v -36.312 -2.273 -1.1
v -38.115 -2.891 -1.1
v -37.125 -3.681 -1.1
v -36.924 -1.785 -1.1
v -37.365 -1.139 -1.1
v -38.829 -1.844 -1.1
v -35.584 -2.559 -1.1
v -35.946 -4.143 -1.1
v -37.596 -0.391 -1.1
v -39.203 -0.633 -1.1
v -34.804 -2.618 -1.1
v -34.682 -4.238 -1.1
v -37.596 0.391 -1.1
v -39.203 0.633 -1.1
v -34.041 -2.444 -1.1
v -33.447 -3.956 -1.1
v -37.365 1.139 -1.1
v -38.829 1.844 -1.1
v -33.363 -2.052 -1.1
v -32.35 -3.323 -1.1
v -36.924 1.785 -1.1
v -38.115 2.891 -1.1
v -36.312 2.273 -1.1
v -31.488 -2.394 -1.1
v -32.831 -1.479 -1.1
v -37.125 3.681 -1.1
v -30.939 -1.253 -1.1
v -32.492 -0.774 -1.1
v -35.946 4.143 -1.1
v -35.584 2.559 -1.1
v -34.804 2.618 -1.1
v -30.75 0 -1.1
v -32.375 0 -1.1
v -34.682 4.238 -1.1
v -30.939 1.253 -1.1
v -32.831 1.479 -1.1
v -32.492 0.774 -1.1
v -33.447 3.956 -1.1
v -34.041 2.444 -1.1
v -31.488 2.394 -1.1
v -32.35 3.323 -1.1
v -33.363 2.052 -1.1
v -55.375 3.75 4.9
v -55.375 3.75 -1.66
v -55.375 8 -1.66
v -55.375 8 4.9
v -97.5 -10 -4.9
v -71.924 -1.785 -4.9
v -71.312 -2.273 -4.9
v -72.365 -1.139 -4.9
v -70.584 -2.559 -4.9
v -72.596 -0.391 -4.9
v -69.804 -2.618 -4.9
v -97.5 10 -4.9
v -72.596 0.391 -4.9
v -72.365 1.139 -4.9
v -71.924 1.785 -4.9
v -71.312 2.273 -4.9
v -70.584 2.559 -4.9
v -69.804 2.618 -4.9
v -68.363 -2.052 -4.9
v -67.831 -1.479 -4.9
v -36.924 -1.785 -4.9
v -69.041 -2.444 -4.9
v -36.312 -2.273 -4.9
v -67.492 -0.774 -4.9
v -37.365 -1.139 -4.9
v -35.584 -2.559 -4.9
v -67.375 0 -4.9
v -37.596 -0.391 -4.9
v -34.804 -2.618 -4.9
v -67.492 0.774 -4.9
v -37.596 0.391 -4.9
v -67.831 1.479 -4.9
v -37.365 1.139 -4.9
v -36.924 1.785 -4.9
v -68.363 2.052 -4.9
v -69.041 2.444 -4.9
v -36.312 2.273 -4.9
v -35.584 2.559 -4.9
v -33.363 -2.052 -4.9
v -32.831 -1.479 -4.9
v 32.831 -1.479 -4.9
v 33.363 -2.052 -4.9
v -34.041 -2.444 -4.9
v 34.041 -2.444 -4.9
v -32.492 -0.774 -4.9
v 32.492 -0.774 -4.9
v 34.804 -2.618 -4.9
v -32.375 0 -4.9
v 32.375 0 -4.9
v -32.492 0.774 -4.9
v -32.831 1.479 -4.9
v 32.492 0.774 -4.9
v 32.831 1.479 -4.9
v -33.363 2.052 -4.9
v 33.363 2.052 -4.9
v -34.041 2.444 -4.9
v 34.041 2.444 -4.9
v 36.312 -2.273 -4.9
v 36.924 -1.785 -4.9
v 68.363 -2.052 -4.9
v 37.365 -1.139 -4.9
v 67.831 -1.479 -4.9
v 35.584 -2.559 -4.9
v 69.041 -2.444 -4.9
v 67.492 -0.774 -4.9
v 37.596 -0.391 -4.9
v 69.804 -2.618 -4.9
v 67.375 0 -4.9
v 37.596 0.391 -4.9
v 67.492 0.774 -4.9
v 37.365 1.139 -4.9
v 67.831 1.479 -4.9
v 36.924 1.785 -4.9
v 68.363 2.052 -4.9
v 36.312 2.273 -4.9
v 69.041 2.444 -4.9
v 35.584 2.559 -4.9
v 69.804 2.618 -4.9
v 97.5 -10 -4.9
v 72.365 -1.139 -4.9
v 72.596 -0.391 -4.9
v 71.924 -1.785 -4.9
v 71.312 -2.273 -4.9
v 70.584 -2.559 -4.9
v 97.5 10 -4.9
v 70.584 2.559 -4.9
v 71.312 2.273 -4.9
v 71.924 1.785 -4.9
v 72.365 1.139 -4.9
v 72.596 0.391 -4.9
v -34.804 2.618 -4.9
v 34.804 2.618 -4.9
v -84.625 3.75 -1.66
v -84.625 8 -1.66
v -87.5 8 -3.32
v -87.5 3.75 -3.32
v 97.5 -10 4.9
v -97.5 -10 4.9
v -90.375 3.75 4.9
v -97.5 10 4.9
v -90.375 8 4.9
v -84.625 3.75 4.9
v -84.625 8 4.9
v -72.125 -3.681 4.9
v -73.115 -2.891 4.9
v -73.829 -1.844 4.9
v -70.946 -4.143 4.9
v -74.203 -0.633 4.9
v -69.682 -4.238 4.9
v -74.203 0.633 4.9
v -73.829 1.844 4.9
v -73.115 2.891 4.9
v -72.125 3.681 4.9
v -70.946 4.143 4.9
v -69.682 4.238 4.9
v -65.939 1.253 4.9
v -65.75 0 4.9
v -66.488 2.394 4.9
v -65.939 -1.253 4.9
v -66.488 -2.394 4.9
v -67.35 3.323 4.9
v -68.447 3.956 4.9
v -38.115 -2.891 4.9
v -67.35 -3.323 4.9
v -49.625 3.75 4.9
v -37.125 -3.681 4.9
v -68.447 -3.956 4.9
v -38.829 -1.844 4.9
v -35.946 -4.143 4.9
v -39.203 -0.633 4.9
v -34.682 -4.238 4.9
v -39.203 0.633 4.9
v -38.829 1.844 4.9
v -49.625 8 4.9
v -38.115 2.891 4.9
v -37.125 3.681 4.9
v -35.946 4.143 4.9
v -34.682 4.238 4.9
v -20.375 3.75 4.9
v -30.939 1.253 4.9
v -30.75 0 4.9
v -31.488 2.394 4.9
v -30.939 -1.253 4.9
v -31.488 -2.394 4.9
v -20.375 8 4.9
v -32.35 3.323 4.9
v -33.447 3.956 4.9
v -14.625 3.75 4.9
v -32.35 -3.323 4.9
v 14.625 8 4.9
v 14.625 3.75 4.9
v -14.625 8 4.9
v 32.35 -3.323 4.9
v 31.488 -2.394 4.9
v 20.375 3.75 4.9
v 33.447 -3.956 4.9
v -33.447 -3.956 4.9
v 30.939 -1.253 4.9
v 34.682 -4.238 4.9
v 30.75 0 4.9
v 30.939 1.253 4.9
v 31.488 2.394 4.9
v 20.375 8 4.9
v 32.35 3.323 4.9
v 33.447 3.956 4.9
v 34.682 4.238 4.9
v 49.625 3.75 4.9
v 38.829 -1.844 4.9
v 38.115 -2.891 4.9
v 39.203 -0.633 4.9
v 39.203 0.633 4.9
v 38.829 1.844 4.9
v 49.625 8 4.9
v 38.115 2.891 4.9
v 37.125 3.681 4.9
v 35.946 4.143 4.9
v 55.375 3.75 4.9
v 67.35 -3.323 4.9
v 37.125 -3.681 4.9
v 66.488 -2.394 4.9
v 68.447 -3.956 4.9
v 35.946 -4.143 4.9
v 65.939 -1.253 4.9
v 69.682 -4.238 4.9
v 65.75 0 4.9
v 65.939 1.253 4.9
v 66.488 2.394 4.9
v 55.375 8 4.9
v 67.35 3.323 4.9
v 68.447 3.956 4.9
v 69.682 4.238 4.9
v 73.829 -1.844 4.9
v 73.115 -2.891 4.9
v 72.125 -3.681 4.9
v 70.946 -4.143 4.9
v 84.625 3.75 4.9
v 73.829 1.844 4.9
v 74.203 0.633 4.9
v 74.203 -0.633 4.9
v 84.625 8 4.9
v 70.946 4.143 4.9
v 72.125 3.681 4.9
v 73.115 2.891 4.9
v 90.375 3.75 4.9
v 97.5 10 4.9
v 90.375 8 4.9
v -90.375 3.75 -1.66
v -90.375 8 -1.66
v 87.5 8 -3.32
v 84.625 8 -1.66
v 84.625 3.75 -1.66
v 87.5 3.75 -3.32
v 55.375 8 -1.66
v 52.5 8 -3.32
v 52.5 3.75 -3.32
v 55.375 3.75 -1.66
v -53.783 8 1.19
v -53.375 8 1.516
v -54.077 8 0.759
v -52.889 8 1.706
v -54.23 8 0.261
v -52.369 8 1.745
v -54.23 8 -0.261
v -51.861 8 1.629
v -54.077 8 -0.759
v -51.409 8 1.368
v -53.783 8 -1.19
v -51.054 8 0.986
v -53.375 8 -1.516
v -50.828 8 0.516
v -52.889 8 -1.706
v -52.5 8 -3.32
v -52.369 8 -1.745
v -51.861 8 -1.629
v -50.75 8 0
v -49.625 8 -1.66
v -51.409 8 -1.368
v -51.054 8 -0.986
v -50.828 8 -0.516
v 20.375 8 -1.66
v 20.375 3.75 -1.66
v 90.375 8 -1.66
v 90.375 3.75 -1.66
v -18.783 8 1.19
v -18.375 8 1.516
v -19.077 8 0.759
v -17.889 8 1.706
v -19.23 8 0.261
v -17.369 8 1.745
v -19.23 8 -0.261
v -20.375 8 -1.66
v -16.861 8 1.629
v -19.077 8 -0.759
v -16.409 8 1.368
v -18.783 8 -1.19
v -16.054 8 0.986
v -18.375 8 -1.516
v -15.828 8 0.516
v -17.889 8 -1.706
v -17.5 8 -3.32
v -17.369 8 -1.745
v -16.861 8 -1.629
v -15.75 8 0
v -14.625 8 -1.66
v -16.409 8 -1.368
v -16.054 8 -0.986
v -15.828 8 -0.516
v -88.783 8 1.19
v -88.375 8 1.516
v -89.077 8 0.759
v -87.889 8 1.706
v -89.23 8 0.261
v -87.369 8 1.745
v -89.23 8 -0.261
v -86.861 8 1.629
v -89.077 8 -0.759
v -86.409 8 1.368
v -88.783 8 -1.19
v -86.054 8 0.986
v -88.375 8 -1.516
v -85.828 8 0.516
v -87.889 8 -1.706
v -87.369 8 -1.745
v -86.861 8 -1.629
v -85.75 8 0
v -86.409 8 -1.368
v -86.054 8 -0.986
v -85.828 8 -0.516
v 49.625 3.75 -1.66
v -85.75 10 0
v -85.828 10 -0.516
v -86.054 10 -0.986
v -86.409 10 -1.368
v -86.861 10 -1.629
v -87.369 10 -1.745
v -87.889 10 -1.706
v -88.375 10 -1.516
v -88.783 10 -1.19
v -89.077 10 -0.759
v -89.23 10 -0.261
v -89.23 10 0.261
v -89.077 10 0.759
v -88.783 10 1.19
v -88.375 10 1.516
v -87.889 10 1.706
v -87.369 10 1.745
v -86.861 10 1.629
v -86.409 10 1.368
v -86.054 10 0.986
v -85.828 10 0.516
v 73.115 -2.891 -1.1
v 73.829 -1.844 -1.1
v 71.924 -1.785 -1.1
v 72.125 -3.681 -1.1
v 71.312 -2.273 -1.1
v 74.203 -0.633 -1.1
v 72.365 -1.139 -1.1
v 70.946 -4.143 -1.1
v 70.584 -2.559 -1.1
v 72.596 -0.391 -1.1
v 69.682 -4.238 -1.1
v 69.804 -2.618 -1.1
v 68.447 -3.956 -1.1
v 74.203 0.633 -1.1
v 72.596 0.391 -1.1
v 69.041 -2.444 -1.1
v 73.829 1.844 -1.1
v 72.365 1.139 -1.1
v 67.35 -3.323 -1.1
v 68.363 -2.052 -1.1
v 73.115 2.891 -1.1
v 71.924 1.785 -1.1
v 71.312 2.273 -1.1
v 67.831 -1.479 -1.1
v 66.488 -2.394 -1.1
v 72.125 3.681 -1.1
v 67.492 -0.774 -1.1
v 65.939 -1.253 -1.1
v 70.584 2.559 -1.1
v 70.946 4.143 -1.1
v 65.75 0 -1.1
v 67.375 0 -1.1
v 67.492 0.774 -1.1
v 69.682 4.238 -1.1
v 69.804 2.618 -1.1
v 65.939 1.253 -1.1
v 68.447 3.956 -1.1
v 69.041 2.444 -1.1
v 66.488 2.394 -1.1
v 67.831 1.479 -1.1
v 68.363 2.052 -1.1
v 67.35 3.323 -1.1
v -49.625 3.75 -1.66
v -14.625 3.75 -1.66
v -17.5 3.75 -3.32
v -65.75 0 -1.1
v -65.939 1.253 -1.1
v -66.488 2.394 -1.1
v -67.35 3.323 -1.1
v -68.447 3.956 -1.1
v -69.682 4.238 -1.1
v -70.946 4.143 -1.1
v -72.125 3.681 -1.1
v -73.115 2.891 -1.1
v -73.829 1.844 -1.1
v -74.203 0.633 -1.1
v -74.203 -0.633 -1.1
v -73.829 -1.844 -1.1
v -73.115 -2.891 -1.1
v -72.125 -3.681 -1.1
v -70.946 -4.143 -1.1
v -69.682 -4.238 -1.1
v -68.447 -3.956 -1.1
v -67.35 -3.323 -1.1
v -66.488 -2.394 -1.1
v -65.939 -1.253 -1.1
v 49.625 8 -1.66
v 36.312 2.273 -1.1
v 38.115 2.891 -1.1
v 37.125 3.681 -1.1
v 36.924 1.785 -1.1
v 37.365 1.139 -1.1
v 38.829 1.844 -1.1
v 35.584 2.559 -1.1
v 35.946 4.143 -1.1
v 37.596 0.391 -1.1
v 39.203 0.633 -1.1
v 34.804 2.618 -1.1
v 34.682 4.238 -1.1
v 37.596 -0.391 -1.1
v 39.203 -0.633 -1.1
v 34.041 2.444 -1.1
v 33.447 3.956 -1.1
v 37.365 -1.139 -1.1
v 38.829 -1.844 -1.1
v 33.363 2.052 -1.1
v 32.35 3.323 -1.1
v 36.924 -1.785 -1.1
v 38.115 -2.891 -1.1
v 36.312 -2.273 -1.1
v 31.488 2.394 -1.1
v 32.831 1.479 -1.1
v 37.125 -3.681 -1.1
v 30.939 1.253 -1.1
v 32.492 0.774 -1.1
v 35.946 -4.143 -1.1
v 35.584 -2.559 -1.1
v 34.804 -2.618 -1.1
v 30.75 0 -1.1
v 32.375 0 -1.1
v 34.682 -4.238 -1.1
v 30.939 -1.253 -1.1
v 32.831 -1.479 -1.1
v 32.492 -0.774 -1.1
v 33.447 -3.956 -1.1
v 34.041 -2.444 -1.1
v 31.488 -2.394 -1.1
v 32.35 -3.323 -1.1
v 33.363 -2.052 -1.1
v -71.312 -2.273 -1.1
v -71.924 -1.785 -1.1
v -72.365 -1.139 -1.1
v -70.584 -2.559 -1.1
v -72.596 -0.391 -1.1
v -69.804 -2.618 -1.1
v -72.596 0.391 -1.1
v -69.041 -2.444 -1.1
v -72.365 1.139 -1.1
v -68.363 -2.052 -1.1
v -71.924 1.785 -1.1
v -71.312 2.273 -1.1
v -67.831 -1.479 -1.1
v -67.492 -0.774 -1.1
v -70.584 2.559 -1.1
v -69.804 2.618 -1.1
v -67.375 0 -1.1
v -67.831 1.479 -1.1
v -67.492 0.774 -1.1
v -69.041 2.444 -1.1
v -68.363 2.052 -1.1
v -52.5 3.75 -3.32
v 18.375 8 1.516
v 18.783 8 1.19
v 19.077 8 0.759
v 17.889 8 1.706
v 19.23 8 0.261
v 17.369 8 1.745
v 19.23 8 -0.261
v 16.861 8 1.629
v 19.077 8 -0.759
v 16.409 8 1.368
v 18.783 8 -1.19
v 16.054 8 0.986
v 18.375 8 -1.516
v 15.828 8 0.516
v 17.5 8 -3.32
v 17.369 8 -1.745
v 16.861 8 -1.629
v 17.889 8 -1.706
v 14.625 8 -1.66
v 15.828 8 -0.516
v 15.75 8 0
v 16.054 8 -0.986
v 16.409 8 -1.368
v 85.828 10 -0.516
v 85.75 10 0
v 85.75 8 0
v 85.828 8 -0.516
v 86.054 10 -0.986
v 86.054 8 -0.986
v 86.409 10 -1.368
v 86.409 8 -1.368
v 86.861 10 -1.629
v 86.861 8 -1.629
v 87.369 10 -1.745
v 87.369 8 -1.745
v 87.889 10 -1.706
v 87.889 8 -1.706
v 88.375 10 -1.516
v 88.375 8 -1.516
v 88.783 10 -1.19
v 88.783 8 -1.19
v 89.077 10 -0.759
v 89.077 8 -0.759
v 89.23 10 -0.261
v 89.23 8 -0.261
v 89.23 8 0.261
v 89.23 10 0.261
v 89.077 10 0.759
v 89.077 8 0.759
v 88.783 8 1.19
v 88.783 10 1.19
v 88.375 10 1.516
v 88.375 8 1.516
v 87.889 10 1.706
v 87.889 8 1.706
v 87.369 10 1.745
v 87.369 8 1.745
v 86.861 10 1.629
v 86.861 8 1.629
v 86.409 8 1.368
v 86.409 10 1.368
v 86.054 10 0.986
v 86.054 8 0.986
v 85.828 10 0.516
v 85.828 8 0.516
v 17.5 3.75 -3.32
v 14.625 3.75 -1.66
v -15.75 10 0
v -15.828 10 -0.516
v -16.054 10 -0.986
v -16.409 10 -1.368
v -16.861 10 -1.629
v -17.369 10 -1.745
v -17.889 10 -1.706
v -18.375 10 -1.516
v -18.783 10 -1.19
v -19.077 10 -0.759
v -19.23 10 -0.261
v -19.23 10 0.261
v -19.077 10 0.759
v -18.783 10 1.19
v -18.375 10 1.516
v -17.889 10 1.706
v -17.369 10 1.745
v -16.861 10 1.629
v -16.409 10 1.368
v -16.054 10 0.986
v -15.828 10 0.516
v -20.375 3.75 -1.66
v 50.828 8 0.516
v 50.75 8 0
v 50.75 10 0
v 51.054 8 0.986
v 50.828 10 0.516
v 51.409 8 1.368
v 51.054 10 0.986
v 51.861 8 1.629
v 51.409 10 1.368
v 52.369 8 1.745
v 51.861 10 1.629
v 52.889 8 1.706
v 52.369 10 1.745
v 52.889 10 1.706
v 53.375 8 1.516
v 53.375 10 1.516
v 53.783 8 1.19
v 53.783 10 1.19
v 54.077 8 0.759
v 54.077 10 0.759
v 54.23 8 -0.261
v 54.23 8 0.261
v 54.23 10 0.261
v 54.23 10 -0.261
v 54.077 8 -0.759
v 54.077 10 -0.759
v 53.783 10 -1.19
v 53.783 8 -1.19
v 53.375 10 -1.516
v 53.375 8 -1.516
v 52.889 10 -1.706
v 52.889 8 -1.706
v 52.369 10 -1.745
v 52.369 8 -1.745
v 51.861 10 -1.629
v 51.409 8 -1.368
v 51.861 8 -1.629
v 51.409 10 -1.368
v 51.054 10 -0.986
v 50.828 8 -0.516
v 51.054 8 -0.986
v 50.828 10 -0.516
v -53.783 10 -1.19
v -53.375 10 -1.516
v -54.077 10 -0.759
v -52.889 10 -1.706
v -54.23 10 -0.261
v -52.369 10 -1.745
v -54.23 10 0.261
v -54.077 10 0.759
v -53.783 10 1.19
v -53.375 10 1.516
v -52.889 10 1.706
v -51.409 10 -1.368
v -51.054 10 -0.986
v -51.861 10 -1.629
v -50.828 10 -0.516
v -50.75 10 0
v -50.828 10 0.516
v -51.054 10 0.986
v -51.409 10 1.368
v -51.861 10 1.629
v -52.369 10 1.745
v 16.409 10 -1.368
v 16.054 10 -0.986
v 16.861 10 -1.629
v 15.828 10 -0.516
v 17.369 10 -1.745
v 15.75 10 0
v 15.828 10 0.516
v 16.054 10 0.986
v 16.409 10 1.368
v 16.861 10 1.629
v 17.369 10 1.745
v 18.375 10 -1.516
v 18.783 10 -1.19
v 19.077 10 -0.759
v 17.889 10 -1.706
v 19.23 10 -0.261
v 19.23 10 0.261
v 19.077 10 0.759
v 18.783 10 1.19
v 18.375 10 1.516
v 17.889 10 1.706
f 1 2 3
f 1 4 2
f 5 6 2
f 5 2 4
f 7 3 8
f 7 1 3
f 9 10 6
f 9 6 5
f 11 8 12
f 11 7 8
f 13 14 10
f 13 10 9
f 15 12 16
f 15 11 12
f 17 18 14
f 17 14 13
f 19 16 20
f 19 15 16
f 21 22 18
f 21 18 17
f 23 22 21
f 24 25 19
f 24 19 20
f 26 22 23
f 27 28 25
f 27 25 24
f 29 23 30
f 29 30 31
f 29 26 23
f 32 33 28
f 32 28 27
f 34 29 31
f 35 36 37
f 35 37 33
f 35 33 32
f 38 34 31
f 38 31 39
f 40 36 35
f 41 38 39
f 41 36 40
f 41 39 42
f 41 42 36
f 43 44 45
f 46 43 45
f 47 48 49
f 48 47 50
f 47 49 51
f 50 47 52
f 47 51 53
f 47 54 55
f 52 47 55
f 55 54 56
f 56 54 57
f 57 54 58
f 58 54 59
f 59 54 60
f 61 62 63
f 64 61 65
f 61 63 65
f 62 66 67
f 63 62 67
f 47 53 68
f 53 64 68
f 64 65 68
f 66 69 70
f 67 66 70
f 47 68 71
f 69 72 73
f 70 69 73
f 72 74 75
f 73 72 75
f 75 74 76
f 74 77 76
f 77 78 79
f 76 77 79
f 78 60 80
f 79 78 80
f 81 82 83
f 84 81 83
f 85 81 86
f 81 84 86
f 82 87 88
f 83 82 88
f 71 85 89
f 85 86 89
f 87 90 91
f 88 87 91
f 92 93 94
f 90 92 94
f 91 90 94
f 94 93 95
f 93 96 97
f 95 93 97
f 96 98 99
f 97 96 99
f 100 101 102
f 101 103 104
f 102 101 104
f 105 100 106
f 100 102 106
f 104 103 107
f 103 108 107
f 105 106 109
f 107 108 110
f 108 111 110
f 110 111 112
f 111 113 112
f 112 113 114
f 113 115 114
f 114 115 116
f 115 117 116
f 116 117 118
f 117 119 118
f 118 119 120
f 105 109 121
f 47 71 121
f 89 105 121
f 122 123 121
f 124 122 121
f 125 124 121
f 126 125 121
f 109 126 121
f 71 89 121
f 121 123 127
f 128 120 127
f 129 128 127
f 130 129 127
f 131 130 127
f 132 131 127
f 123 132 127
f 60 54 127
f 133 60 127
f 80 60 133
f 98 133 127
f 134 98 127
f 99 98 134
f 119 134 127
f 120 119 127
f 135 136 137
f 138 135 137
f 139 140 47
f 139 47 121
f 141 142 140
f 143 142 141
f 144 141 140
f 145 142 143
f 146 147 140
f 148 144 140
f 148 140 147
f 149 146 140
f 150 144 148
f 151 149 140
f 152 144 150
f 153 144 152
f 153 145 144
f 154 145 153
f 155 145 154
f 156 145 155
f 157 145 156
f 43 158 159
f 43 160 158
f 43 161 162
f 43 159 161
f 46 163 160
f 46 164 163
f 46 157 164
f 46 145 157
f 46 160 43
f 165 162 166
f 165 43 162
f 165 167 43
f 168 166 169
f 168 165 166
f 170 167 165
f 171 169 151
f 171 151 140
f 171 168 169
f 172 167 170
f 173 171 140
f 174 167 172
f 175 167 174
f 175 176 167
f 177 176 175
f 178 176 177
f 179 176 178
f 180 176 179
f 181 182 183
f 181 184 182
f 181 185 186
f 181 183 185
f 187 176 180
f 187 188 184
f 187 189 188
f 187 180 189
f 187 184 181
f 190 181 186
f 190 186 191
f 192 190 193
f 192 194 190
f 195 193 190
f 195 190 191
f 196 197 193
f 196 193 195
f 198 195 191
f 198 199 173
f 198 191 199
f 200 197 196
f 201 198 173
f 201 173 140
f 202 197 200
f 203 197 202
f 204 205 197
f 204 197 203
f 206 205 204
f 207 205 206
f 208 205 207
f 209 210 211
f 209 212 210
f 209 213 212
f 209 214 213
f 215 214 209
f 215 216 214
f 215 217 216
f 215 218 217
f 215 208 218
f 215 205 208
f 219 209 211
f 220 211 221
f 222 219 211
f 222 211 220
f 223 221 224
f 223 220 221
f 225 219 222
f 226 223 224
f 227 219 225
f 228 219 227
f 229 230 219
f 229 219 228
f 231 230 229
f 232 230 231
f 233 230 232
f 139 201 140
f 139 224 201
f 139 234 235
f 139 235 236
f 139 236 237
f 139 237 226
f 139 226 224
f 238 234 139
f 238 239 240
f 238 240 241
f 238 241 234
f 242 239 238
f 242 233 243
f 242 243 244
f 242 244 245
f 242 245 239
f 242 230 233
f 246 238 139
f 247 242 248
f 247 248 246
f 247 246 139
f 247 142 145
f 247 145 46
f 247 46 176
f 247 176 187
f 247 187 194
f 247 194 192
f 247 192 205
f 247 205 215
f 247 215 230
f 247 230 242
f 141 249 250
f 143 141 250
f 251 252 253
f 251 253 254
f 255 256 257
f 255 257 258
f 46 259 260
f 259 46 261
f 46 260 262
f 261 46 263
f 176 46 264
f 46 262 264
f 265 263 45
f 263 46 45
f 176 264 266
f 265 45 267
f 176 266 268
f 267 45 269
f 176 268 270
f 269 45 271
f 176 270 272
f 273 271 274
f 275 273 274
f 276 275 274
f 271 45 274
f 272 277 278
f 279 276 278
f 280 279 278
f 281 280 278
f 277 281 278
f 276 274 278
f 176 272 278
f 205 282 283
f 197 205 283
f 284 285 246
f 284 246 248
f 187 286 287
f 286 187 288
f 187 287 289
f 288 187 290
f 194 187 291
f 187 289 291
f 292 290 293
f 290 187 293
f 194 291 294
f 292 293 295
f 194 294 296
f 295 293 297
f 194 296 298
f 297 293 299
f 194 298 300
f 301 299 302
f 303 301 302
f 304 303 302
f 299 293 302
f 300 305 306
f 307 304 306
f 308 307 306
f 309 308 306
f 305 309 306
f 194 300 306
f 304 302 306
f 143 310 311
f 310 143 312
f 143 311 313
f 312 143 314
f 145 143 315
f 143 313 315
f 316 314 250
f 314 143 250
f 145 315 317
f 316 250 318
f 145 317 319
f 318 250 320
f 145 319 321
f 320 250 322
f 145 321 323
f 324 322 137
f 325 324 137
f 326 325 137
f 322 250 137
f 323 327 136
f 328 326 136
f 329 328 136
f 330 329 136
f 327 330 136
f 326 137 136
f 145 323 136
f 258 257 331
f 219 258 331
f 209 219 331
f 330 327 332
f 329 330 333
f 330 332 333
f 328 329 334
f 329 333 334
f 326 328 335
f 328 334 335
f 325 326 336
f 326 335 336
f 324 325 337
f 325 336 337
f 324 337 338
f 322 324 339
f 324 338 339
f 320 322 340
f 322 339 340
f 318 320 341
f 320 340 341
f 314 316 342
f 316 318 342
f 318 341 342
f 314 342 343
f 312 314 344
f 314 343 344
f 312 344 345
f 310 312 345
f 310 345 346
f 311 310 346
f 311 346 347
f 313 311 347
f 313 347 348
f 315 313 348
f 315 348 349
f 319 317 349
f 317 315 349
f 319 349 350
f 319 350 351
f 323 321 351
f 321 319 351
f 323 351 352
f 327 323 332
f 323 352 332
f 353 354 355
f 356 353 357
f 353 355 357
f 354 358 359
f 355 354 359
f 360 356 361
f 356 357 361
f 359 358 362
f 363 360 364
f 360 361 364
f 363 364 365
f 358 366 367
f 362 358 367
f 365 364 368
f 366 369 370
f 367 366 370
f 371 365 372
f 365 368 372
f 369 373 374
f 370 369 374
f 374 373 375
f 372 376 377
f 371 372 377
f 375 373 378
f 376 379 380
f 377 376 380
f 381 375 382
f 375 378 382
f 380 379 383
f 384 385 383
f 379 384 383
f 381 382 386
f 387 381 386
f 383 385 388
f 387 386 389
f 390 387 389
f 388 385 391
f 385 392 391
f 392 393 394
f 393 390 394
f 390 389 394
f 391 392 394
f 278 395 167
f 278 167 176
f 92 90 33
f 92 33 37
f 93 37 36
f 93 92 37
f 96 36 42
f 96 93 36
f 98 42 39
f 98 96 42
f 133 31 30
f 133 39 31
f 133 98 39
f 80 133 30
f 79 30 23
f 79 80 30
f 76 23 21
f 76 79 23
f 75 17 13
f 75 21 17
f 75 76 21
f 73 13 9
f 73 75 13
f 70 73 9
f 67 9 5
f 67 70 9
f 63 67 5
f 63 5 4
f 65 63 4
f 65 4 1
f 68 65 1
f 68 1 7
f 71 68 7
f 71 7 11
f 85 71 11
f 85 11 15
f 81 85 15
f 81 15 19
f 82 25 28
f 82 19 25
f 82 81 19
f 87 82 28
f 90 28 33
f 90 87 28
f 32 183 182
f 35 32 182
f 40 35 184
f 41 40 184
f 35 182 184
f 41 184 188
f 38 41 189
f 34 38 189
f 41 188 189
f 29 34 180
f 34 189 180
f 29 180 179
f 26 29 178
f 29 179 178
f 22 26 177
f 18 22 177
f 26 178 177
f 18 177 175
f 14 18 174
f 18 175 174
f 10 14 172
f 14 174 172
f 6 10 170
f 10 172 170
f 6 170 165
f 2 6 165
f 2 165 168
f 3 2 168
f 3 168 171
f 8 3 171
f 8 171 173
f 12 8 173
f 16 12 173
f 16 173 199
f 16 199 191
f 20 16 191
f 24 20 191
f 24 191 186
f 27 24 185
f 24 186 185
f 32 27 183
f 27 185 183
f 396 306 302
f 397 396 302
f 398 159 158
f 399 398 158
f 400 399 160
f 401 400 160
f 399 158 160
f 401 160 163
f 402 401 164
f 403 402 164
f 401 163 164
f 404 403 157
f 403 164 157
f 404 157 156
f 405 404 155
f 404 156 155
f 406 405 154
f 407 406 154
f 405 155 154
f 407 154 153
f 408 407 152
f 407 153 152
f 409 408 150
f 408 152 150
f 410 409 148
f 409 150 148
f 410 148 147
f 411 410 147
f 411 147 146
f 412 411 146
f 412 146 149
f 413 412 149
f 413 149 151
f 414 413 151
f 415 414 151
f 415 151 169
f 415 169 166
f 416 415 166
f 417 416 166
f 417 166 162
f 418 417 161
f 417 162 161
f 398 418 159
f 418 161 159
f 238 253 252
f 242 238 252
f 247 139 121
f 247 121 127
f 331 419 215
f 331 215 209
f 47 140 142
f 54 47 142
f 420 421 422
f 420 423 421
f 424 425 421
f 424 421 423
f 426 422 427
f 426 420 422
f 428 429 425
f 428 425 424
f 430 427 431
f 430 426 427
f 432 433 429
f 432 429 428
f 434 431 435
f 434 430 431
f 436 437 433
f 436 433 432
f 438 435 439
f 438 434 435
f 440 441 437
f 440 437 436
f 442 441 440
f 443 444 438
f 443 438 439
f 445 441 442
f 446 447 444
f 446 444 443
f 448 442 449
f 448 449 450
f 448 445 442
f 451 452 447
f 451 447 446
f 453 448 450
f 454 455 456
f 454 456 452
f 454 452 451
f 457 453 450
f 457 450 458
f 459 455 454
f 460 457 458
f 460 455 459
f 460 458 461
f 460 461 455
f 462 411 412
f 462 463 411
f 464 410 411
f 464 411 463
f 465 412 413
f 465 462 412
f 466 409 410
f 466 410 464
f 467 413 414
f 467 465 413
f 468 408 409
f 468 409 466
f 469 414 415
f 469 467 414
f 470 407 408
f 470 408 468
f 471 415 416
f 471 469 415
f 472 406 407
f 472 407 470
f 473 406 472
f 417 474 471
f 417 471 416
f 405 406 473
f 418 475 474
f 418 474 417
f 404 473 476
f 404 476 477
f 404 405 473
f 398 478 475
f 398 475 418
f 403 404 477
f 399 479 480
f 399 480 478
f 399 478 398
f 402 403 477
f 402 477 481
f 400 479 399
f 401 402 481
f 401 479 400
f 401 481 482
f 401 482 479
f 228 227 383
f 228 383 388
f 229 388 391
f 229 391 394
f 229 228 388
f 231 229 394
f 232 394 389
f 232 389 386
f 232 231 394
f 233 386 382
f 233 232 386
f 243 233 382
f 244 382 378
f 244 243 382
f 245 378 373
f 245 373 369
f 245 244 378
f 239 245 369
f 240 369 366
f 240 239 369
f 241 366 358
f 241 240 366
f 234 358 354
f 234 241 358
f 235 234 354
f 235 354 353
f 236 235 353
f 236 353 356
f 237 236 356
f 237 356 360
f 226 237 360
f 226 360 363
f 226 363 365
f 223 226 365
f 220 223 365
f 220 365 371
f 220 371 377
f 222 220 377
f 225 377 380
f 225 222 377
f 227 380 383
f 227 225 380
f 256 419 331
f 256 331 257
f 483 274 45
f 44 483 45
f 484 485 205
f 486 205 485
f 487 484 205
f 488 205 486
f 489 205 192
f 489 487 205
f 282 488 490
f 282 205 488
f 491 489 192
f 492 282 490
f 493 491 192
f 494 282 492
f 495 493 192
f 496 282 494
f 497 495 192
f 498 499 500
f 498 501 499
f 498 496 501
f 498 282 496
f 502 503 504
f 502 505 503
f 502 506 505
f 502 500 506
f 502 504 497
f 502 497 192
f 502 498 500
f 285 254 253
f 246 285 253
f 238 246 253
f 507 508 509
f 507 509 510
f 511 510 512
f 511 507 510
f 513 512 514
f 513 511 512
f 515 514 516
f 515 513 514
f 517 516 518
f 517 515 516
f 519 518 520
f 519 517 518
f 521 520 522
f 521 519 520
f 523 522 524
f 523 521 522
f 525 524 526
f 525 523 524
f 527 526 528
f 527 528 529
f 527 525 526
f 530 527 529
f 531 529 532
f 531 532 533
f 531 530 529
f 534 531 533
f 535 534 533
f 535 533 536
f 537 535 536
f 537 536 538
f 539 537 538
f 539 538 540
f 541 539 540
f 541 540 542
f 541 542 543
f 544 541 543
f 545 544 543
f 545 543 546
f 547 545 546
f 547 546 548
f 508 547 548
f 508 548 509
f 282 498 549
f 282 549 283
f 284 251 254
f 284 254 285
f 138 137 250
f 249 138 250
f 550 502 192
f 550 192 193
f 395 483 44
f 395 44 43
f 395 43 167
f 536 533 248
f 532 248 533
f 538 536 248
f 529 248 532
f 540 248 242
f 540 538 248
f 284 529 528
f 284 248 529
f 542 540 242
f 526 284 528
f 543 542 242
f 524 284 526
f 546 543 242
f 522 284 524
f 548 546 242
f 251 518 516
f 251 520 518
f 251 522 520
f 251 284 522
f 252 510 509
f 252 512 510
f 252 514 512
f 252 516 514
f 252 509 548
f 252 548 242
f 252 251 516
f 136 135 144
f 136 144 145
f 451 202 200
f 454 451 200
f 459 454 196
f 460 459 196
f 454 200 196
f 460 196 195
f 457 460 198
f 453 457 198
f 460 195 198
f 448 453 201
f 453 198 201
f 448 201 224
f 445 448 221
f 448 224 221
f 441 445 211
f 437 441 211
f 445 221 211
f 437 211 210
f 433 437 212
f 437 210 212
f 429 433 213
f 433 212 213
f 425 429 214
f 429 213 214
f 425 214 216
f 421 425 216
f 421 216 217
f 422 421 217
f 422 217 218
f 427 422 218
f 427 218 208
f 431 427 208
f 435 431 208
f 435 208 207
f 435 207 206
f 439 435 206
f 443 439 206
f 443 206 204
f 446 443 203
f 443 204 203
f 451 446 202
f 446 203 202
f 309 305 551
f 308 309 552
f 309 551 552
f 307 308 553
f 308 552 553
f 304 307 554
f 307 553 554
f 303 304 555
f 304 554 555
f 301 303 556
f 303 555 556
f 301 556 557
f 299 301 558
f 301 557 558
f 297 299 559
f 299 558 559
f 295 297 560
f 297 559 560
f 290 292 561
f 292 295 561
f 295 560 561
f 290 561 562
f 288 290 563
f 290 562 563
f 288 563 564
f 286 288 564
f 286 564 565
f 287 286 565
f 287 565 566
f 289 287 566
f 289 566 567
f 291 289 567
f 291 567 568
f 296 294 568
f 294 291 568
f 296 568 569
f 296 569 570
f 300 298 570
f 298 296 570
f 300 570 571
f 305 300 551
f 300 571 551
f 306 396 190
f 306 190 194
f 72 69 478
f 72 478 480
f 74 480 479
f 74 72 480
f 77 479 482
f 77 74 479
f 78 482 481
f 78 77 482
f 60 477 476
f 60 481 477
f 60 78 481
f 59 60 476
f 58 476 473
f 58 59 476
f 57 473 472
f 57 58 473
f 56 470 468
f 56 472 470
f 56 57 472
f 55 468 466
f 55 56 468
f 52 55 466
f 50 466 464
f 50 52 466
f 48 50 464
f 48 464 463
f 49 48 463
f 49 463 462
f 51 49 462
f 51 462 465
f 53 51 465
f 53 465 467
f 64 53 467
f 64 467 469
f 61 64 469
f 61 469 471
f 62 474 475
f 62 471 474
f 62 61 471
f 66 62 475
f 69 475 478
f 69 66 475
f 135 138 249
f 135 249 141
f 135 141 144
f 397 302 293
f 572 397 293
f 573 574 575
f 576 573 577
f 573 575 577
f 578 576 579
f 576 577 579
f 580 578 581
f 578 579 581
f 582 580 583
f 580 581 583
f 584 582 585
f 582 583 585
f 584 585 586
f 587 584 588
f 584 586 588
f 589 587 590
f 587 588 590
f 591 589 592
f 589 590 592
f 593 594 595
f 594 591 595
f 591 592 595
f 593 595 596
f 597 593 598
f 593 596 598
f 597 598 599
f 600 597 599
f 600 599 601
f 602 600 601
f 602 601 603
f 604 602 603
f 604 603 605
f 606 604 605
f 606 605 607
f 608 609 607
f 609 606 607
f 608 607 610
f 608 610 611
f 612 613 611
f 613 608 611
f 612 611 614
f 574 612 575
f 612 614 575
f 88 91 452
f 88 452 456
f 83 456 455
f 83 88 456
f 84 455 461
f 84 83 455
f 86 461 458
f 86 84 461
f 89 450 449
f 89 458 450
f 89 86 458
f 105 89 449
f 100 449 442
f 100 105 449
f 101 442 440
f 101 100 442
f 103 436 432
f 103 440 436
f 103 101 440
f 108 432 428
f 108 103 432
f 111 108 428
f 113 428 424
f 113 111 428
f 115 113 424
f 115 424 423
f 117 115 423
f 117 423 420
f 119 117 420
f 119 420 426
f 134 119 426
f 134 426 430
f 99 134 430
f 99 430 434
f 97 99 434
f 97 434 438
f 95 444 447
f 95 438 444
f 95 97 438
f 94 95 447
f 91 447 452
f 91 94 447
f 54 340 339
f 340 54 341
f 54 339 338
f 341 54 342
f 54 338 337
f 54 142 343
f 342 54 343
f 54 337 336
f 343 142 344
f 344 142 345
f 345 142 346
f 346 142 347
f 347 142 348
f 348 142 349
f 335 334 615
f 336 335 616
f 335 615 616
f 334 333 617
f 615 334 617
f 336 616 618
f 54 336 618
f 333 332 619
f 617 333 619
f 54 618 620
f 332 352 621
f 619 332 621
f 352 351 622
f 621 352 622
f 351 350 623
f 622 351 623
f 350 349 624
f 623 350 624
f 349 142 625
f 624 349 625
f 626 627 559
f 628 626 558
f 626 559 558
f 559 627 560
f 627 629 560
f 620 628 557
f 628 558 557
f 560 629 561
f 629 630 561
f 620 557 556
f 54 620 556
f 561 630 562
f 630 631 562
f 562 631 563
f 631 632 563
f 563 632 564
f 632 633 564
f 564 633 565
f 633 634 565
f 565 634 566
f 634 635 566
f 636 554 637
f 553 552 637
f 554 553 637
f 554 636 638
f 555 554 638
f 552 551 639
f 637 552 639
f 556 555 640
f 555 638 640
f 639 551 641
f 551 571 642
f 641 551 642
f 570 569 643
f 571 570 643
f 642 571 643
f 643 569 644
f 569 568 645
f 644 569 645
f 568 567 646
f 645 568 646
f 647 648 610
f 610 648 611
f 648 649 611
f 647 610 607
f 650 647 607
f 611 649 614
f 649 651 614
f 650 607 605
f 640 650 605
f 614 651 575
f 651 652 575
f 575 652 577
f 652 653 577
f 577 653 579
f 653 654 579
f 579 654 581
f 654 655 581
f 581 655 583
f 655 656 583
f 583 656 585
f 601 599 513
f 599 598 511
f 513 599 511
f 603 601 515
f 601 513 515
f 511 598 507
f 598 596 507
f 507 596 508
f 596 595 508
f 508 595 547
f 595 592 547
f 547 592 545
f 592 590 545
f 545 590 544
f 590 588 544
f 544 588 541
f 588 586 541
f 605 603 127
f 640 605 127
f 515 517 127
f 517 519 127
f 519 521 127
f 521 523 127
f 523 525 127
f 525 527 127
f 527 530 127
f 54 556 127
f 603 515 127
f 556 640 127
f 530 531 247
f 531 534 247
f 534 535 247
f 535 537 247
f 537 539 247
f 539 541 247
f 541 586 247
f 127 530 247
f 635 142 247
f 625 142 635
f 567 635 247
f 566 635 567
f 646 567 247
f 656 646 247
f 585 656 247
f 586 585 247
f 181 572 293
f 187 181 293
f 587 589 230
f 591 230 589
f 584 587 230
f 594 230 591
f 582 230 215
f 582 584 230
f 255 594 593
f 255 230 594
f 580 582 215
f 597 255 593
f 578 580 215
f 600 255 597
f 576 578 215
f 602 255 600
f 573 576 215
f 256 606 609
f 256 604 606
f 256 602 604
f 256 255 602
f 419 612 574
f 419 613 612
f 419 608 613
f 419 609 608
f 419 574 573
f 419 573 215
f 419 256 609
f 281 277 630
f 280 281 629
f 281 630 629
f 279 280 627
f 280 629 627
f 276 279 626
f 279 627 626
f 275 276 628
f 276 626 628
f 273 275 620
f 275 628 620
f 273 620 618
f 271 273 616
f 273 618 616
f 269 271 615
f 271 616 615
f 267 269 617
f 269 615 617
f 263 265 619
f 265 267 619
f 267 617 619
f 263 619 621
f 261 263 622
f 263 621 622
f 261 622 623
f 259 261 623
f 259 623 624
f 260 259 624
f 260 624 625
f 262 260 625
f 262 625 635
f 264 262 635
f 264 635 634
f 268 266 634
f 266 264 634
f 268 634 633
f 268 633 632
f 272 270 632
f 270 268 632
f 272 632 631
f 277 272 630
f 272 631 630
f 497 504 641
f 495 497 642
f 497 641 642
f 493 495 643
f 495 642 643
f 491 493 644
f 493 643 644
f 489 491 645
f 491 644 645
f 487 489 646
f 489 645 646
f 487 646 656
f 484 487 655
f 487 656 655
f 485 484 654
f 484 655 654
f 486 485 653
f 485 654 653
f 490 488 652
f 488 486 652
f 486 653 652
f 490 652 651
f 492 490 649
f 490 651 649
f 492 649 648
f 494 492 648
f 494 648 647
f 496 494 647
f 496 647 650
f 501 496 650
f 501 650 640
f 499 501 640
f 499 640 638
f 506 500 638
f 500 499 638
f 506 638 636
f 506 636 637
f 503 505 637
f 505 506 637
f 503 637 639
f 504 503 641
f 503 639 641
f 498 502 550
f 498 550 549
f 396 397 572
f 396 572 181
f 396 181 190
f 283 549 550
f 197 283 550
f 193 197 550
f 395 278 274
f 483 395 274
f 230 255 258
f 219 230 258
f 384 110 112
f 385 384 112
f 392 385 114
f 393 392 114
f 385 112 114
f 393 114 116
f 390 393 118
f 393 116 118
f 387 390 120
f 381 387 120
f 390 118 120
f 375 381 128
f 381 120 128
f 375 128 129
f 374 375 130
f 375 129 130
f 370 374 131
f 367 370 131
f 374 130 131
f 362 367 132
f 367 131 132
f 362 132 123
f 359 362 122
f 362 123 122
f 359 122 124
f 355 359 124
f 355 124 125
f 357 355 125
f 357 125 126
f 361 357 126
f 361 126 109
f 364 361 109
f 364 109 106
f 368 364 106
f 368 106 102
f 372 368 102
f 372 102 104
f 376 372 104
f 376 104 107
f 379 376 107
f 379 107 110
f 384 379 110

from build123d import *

# Parameters (mm, degrees)
SKETCH1_W               = 195
SKETCH1_H               = 20
BOSS_EXTRUDE1_DEPTH     = 4.9
SKETCH2_R               = 1.75
CUT_EXTRUDE1_DEPTH      = 6
CUT_EXTRUDE2_START      = -2
CUT_EXTRUDE2_DEPTH      = 4.25
SKETCH4_W               = 5.75
SKETCH4_H               = 4.25
CUT_EXTRUDE3_DEPTH      = 5.9
LPATTERN1_COUNT         = 3
LPATTERN1_PITCH         = 35
MIRROR1_COPY_1_SKETCH_R = 1.75
MIRROR1_COPY_1_DEPTH    = 6
MIRROR1_COPY_2_SKETCH_R = 1.75
MIRROR1_COPY_2_DEPTH    = 6
MIRROR1_START           = -2
MIRROR1_COPY_3_DEPTH    = 4.25
MIRROR1_COPY_4_DEPTH    = 4.25
MIRROR1_COPY_5_SKETCH_W = 5.75
MIRROR1_COPY_5_SKETCH_H = 4.25
MIRROR1_COPY_5_DEPTH    = 5.9
MIRROR1_COPY_6_SKETCH_W = 5.75
MIRROR1_COPY_6_SKETCH_H = 4.25
MIRROR1_COPY_6_DEPTH    = 5.9
SKETCH5_R               = 4.25
CUT_EXTRUDE4_DEPTH      = 6
CUT_EXTRUDE5_START      = -4.8
SKETCH6_R               = 2.625
CUT_EXTRUDE5_DEPTH      = 11.8
LPATTERN2_COUNT         = 2
LPATTERN2_PITCH         = 35
MIRROR2_COPY_1_SKETCH_R = 4.25
MIRROR2_COPY_1_DEPTH    = 6
MIRROR2_START           = -4.8
MIRROR2_COPY_2_SKETCH_R = 2.625
MIRROR2_COPY_2_DEPTH    = 11.8


with BuildPart() as part:
    # Sketch1 → Boss-Extrude1 (new body, symmetric)
    with BuildSketch(Plane.XY):
        Rectangle(SKETCH1_W, SKETCH1_H)
    extrude(amount=BOSS_EXTRUDE1_DEPTH, both=True)

    # Sketch2 → Cut-Extrude1 (cut)
    with BuildSketch(Plane(origin=(0, 10, 0), x_dir=(1, 0, 0), z_dir=(0, 1, 0))):
        with Locations((-87.5, 0)):
            Circle(SKETCH2_R)
    cut_extrude1 = extrude(amount=-CUT_EXTRUDE1_DEPTH, mode=Mode.SUBTRACT)

    # Sketch3 → Cut-Extrude2 (cut)
    with BuildSketch(Plane(origin=(0, 10, 0), x_dir=(1, 0, 0), z_dir=(0, 1, 0)).offset(CUT_EXTRUDE2_START)):
        Polygon((-87.5, 3.319764048), (-90.375, 1.659882024), (-90.375, -1.659882024), (-87.5, -3.319764048), (-84.625, -1.659882024), (-84.625, 1.659882024), align=None)
    cut_extrude2 = extrude(amount=-CUT_EXTRUDE2_DEPTH, mode=Mode.SUBTRACT)

    # Sketch4 → Cut-Extrude3 (cut, through all)
    with BuildSketch(Plane.XY):
        with Locations((-87.5, 5.875)):
            Rectangle(SKETCH4_W, SKETCH4_H)
    cut_extrude3 = extrude(amount=CUT_EXTRUDE3_DEPTH, mode=Mode.SUBTRACT)

    # LPattern1: Cut-Extrude1, Cut-Extrude2, Cut-Extrude3 ×3
    with Locations(*[(i * LPATTERN1_PITCH, 0, 0) for i in range(1, LPATTERN1_COUNT)]):
        add(cut_extrude1, mode=Mode.SUBTRACT)
        add(cut_extrude2, mode=Mode.SUBTRACT)
        add(cut_extrude3, mode=Mode.SUBTRACT)

    # Mirror1: Cut-Extrude1, Cut-Extrude2, Cut-Extrude3 across plane
    add(cut_extrude1.mirror(Plane(origin=(0, 0, 0), x_dir=(0, 0, 1), z_dir=(1, 0, 0))), mode=Mode.SUBTRACT)
    add(cut_extrude2.mirror(Plane(origin=(0, 0, 0), x_dir=(0, 0, 1), z_dir=(1, 0, 0))), mode=Mode.SUBTRACT)
    add(cut_extrude3.mirror(Plane(origin=(0, 0, 0), x_dir=(0, 0, 1), z_dir=(1, 0, 0))), mode=Mode.SUBTRACT)

    # Mirror1 copy 1 sketch → Mirror1 copy 1 (cut)
    with BuildSketch(Plane(origin=(-35, 10, 0), x_dir=(-1, 0, 0), z_dir=(0, 1, 0))):
        with Locations((-87.5, 0)):
            Circle(MIRROR1_COPY_1_SKETCH_R)
    extrude(amount=-MIRROR1_COPY_1_DEPTH, mode=Mode.SUBTRACT)

    # Mirror1 copy 2 sketch → Mirror1 copy 2 (cut)
    with BuildSketch(Plane(origin=(-70, 10, 0), x_dir=(-1, 0, 0), z_dir=(0, 1, 0))):
        with Locations((-87.5, 0)):
            Circle(MIRROR1_COPY_2_SKETCH_R)
    extrude(amount=-MIRROR1_COPY_2_DEPTH, mode=Mode.SUBTRACT)

    # Mirror1 copy 3 sketch → Mirror1 copy 3 (cut)
    with BuildSketch(Plane(origin=(-35, 10, 0), x_dir=(-1, 0, 0), z_dir=(0, 1, 0)).offset(MIRROR1_START)):
        Polygon((-87.5, -3.319764048), (-90.375, -1.659882024), (-90.375, 1.659882024), (-87.5, 3.319764048), (-84.625, 1.659882024), (-84.625, -1.659882024), align=None)
    extrude(amount=-MIRROR1_COPY_3_DEPTH, mode=Mode.SUBTRACT)

    # Mirror1 copy 4 sketch → Mirror1 copy 4 (cut)
    with BuildSketch(Plane(origin=(-70, 10, 0), x_dir=(-1, 0, 0), z_dir=(0, 1, 0)).offset(MIRROR1_START)):
        Polygon((-87.5, -3.319764048), (-90.375, -1.659882024), (-90.375, 1.659882024), (-87.5, 3.319764048), (-84.625, 1.659882024), (-84.625, -1.659882024), align=None)
    extrude(amount=-MIRROR1_COPY_4_DEPTH, mode=Mode.SUBTRACT)

    # Mirror1 copy 5 sketch → Mirror1 copy 5 (cut, through all)
    with BuildSketch(Plane(origin=(-35, 0, 0), x_dir=(-1, 0, 0), z_dir=(0, 0, 1))):
        with Locations((-87.5, -5.875)):
            Rectangle(MIRROR1_COPY_5_SKETCH_W, MIRROR1_COPY_5_SKETCH_H)
    extrude(amount=MIRROR1_COPY_5_DEPTH, mode=Mode.SUBTRACT)

    # Mirror1 copy 6 sketch → Mirror1 copy 6 (cut, through all)
    with BuildSketch(Plane(origin=(-70, 0, 0), x_dir=(-1, 0, 0), z_dir=(0, 0, 1))):
        with Locations((-87.5, -5.875)):
            Rectangle(MIRROR1_COPY_6_SKETCH_W, MIRROR1_COPY_6_SKETCH_H)
    extrude(amount=MIRROR1_COPY_6_DEPTH, mode=Mode.SUBTRACT)

    # Sketch5 → Cut-Extrude4 (cut)
    with BuildSketch(Plane.XY.offset(4.9)):
        with Locations((-70, 0)):
            Circle(SKETCH5_R)
    cut_extrude4 = extrude(amount=-CUT_EXTRUDE4_DEPTH, mode=Mode.SUBTRACT)

    # Sketch6 → Cut-Extrude5 (cut)
    with BuildSketch(Plane.XY.offset(-1.1).offset(CUT_EXTRUDE5_START)):
        with Locations((-70, 0)):
            Circle(SKETCH6_R)
    cut_extrude5 = extrude(amount=CUT_EXTRUDE5_DEPTH, mode=Mode.SUBTRACT)

    # LPattern2: Cut-Extrude4, Cut-Extrude5 ×2
    with Locations(*[(i * LPATTERN2_PITCH, 0, 0) for i in range(1, LPATTERN2_COUNT)]):
        add(cut_extrude4, mode=Mode.SUBTRACT)
        add(cut_extrude5, mode=Mode.SUBTRACT)

    # Mirror2: Cut-Extrude4, Cut-Extrude5 across plane
    add(cut_extrude4.mirror(Plane(origin=(0, 0, 0), x_dir=(0, 0, 1), z_dir=(1, 0, 0))), mode=Mode.SUBTRACT)
    add(cut_extrude5.mirror(Plane(origin=(0, 0, 0), x_dir=(0, 0, 1), z_dir=(1, 0, 0))), mode=Mode.SUBTRACT)

    # Mirror2 copy 1 sketch → Mirror2 copy 1 (cut)
    with BuildSketch(Plane(origin=(-35, 0, 4.9), x_dir=(-1, 0, 0), z_dir=(0, 0, 1))):
        with Locations((-70, 0)):
            Circle(MIRROR2_COPY_1_SKETCH_R)
    extrude(amount=-MIRROR2_COPY_1_DEPTH, mode=Mode.SUBTRACT)

    # Mirror2 copy 2 sketch → Mirror2 copy 2 (cut)
    with BuildSketch(Plane(origin=(-35, 0, -1.1), x_dir=(-1, 0, 0), z_dir=(0, 0, 1)).offset(MIRROR2_START)):
        with Locations((-70, 0)):
            Circle(MIRROR2_COPY_2_SKETCH_R)
    extrude(amount=MIRROR2_COPY_2_DEPTH, mode=Mode.SUBTRACT)


solid = part.part
